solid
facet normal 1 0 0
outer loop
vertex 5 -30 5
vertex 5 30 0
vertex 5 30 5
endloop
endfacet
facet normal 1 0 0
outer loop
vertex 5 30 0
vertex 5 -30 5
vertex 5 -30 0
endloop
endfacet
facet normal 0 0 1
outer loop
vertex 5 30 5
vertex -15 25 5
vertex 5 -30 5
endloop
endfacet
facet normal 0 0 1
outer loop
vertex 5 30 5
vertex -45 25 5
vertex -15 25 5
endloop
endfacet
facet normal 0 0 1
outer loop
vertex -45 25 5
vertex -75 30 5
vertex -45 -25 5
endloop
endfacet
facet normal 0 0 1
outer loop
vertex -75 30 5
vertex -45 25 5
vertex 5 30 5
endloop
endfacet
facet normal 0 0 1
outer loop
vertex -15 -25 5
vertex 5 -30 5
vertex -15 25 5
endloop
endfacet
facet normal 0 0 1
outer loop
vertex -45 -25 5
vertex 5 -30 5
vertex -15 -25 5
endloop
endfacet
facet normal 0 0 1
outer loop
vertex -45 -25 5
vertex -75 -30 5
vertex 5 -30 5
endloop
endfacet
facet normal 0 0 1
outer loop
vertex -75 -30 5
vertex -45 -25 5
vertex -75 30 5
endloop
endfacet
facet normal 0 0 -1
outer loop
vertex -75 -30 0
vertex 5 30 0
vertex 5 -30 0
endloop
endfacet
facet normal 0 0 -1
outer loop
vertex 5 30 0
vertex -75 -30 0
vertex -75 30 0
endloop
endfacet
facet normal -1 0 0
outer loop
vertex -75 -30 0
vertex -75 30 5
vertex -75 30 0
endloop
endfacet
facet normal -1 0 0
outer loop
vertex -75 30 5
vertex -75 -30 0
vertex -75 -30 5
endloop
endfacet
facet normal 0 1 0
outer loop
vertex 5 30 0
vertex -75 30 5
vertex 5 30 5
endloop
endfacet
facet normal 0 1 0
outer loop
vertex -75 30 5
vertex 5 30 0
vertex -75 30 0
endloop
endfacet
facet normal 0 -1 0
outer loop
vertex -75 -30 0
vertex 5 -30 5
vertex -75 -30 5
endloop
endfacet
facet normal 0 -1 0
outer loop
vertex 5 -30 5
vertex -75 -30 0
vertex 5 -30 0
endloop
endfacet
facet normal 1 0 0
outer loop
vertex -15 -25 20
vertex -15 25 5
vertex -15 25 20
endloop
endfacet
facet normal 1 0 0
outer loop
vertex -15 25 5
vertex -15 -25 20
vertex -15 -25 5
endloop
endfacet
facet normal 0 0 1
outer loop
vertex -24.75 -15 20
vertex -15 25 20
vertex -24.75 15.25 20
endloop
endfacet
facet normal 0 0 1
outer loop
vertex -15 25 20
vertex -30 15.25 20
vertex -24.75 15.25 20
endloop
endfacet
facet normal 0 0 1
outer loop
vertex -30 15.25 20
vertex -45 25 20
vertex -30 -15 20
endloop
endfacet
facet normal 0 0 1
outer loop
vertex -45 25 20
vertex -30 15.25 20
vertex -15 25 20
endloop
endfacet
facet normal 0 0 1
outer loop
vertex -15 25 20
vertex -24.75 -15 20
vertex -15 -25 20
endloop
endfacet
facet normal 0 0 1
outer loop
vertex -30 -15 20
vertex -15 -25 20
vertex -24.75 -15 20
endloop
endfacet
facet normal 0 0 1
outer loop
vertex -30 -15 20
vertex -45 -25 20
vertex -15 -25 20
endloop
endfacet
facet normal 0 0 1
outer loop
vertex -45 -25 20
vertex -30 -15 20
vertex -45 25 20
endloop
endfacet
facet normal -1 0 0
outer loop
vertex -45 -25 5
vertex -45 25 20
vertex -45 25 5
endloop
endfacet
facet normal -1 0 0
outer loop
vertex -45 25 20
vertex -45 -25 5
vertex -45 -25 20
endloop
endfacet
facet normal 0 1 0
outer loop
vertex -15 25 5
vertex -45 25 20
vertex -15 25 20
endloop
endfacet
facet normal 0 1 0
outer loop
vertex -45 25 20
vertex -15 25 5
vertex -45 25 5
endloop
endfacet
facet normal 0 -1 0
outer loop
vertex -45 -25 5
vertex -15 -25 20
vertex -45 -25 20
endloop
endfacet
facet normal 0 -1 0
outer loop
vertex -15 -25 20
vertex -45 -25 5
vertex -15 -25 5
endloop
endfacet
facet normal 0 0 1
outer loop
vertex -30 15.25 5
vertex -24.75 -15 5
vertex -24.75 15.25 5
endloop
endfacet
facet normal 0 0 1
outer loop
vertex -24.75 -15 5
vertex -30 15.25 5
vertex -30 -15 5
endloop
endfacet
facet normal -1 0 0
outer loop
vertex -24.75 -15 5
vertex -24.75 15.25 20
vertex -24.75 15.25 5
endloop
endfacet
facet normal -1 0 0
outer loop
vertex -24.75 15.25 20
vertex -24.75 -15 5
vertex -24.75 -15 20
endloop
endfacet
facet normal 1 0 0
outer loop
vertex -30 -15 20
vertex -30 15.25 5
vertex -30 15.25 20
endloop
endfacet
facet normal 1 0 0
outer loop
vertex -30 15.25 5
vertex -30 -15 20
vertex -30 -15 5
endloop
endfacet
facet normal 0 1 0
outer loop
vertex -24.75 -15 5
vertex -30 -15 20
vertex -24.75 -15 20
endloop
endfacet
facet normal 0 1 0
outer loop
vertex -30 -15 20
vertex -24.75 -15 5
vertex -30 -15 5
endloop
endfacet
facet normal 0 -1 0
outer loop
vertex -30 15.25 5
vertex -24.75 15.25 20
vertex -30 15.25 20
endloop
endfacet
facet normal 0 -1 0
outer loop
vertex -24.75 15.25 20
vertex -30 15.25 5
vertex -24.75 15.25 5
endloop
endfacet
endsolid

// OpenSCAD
$fn=100;
width=60;//dont change unless you change the width of the part that goes into this slot
length=80;
total_height=25;
hole_thickness=5.25;//dont change these if your using my other design part unless you change the other part the same
difference()
{
union()

{

translate([-75,-30,0])cube([length,width,total_height/5]);
translate([-45,-25,0])cube([length-50,width-10,total_height/1.25]);
}

rotate([0,90,0])translate([-105,-15,-30])cube([total_height*4,width/1.98347107,5.25]);
}
